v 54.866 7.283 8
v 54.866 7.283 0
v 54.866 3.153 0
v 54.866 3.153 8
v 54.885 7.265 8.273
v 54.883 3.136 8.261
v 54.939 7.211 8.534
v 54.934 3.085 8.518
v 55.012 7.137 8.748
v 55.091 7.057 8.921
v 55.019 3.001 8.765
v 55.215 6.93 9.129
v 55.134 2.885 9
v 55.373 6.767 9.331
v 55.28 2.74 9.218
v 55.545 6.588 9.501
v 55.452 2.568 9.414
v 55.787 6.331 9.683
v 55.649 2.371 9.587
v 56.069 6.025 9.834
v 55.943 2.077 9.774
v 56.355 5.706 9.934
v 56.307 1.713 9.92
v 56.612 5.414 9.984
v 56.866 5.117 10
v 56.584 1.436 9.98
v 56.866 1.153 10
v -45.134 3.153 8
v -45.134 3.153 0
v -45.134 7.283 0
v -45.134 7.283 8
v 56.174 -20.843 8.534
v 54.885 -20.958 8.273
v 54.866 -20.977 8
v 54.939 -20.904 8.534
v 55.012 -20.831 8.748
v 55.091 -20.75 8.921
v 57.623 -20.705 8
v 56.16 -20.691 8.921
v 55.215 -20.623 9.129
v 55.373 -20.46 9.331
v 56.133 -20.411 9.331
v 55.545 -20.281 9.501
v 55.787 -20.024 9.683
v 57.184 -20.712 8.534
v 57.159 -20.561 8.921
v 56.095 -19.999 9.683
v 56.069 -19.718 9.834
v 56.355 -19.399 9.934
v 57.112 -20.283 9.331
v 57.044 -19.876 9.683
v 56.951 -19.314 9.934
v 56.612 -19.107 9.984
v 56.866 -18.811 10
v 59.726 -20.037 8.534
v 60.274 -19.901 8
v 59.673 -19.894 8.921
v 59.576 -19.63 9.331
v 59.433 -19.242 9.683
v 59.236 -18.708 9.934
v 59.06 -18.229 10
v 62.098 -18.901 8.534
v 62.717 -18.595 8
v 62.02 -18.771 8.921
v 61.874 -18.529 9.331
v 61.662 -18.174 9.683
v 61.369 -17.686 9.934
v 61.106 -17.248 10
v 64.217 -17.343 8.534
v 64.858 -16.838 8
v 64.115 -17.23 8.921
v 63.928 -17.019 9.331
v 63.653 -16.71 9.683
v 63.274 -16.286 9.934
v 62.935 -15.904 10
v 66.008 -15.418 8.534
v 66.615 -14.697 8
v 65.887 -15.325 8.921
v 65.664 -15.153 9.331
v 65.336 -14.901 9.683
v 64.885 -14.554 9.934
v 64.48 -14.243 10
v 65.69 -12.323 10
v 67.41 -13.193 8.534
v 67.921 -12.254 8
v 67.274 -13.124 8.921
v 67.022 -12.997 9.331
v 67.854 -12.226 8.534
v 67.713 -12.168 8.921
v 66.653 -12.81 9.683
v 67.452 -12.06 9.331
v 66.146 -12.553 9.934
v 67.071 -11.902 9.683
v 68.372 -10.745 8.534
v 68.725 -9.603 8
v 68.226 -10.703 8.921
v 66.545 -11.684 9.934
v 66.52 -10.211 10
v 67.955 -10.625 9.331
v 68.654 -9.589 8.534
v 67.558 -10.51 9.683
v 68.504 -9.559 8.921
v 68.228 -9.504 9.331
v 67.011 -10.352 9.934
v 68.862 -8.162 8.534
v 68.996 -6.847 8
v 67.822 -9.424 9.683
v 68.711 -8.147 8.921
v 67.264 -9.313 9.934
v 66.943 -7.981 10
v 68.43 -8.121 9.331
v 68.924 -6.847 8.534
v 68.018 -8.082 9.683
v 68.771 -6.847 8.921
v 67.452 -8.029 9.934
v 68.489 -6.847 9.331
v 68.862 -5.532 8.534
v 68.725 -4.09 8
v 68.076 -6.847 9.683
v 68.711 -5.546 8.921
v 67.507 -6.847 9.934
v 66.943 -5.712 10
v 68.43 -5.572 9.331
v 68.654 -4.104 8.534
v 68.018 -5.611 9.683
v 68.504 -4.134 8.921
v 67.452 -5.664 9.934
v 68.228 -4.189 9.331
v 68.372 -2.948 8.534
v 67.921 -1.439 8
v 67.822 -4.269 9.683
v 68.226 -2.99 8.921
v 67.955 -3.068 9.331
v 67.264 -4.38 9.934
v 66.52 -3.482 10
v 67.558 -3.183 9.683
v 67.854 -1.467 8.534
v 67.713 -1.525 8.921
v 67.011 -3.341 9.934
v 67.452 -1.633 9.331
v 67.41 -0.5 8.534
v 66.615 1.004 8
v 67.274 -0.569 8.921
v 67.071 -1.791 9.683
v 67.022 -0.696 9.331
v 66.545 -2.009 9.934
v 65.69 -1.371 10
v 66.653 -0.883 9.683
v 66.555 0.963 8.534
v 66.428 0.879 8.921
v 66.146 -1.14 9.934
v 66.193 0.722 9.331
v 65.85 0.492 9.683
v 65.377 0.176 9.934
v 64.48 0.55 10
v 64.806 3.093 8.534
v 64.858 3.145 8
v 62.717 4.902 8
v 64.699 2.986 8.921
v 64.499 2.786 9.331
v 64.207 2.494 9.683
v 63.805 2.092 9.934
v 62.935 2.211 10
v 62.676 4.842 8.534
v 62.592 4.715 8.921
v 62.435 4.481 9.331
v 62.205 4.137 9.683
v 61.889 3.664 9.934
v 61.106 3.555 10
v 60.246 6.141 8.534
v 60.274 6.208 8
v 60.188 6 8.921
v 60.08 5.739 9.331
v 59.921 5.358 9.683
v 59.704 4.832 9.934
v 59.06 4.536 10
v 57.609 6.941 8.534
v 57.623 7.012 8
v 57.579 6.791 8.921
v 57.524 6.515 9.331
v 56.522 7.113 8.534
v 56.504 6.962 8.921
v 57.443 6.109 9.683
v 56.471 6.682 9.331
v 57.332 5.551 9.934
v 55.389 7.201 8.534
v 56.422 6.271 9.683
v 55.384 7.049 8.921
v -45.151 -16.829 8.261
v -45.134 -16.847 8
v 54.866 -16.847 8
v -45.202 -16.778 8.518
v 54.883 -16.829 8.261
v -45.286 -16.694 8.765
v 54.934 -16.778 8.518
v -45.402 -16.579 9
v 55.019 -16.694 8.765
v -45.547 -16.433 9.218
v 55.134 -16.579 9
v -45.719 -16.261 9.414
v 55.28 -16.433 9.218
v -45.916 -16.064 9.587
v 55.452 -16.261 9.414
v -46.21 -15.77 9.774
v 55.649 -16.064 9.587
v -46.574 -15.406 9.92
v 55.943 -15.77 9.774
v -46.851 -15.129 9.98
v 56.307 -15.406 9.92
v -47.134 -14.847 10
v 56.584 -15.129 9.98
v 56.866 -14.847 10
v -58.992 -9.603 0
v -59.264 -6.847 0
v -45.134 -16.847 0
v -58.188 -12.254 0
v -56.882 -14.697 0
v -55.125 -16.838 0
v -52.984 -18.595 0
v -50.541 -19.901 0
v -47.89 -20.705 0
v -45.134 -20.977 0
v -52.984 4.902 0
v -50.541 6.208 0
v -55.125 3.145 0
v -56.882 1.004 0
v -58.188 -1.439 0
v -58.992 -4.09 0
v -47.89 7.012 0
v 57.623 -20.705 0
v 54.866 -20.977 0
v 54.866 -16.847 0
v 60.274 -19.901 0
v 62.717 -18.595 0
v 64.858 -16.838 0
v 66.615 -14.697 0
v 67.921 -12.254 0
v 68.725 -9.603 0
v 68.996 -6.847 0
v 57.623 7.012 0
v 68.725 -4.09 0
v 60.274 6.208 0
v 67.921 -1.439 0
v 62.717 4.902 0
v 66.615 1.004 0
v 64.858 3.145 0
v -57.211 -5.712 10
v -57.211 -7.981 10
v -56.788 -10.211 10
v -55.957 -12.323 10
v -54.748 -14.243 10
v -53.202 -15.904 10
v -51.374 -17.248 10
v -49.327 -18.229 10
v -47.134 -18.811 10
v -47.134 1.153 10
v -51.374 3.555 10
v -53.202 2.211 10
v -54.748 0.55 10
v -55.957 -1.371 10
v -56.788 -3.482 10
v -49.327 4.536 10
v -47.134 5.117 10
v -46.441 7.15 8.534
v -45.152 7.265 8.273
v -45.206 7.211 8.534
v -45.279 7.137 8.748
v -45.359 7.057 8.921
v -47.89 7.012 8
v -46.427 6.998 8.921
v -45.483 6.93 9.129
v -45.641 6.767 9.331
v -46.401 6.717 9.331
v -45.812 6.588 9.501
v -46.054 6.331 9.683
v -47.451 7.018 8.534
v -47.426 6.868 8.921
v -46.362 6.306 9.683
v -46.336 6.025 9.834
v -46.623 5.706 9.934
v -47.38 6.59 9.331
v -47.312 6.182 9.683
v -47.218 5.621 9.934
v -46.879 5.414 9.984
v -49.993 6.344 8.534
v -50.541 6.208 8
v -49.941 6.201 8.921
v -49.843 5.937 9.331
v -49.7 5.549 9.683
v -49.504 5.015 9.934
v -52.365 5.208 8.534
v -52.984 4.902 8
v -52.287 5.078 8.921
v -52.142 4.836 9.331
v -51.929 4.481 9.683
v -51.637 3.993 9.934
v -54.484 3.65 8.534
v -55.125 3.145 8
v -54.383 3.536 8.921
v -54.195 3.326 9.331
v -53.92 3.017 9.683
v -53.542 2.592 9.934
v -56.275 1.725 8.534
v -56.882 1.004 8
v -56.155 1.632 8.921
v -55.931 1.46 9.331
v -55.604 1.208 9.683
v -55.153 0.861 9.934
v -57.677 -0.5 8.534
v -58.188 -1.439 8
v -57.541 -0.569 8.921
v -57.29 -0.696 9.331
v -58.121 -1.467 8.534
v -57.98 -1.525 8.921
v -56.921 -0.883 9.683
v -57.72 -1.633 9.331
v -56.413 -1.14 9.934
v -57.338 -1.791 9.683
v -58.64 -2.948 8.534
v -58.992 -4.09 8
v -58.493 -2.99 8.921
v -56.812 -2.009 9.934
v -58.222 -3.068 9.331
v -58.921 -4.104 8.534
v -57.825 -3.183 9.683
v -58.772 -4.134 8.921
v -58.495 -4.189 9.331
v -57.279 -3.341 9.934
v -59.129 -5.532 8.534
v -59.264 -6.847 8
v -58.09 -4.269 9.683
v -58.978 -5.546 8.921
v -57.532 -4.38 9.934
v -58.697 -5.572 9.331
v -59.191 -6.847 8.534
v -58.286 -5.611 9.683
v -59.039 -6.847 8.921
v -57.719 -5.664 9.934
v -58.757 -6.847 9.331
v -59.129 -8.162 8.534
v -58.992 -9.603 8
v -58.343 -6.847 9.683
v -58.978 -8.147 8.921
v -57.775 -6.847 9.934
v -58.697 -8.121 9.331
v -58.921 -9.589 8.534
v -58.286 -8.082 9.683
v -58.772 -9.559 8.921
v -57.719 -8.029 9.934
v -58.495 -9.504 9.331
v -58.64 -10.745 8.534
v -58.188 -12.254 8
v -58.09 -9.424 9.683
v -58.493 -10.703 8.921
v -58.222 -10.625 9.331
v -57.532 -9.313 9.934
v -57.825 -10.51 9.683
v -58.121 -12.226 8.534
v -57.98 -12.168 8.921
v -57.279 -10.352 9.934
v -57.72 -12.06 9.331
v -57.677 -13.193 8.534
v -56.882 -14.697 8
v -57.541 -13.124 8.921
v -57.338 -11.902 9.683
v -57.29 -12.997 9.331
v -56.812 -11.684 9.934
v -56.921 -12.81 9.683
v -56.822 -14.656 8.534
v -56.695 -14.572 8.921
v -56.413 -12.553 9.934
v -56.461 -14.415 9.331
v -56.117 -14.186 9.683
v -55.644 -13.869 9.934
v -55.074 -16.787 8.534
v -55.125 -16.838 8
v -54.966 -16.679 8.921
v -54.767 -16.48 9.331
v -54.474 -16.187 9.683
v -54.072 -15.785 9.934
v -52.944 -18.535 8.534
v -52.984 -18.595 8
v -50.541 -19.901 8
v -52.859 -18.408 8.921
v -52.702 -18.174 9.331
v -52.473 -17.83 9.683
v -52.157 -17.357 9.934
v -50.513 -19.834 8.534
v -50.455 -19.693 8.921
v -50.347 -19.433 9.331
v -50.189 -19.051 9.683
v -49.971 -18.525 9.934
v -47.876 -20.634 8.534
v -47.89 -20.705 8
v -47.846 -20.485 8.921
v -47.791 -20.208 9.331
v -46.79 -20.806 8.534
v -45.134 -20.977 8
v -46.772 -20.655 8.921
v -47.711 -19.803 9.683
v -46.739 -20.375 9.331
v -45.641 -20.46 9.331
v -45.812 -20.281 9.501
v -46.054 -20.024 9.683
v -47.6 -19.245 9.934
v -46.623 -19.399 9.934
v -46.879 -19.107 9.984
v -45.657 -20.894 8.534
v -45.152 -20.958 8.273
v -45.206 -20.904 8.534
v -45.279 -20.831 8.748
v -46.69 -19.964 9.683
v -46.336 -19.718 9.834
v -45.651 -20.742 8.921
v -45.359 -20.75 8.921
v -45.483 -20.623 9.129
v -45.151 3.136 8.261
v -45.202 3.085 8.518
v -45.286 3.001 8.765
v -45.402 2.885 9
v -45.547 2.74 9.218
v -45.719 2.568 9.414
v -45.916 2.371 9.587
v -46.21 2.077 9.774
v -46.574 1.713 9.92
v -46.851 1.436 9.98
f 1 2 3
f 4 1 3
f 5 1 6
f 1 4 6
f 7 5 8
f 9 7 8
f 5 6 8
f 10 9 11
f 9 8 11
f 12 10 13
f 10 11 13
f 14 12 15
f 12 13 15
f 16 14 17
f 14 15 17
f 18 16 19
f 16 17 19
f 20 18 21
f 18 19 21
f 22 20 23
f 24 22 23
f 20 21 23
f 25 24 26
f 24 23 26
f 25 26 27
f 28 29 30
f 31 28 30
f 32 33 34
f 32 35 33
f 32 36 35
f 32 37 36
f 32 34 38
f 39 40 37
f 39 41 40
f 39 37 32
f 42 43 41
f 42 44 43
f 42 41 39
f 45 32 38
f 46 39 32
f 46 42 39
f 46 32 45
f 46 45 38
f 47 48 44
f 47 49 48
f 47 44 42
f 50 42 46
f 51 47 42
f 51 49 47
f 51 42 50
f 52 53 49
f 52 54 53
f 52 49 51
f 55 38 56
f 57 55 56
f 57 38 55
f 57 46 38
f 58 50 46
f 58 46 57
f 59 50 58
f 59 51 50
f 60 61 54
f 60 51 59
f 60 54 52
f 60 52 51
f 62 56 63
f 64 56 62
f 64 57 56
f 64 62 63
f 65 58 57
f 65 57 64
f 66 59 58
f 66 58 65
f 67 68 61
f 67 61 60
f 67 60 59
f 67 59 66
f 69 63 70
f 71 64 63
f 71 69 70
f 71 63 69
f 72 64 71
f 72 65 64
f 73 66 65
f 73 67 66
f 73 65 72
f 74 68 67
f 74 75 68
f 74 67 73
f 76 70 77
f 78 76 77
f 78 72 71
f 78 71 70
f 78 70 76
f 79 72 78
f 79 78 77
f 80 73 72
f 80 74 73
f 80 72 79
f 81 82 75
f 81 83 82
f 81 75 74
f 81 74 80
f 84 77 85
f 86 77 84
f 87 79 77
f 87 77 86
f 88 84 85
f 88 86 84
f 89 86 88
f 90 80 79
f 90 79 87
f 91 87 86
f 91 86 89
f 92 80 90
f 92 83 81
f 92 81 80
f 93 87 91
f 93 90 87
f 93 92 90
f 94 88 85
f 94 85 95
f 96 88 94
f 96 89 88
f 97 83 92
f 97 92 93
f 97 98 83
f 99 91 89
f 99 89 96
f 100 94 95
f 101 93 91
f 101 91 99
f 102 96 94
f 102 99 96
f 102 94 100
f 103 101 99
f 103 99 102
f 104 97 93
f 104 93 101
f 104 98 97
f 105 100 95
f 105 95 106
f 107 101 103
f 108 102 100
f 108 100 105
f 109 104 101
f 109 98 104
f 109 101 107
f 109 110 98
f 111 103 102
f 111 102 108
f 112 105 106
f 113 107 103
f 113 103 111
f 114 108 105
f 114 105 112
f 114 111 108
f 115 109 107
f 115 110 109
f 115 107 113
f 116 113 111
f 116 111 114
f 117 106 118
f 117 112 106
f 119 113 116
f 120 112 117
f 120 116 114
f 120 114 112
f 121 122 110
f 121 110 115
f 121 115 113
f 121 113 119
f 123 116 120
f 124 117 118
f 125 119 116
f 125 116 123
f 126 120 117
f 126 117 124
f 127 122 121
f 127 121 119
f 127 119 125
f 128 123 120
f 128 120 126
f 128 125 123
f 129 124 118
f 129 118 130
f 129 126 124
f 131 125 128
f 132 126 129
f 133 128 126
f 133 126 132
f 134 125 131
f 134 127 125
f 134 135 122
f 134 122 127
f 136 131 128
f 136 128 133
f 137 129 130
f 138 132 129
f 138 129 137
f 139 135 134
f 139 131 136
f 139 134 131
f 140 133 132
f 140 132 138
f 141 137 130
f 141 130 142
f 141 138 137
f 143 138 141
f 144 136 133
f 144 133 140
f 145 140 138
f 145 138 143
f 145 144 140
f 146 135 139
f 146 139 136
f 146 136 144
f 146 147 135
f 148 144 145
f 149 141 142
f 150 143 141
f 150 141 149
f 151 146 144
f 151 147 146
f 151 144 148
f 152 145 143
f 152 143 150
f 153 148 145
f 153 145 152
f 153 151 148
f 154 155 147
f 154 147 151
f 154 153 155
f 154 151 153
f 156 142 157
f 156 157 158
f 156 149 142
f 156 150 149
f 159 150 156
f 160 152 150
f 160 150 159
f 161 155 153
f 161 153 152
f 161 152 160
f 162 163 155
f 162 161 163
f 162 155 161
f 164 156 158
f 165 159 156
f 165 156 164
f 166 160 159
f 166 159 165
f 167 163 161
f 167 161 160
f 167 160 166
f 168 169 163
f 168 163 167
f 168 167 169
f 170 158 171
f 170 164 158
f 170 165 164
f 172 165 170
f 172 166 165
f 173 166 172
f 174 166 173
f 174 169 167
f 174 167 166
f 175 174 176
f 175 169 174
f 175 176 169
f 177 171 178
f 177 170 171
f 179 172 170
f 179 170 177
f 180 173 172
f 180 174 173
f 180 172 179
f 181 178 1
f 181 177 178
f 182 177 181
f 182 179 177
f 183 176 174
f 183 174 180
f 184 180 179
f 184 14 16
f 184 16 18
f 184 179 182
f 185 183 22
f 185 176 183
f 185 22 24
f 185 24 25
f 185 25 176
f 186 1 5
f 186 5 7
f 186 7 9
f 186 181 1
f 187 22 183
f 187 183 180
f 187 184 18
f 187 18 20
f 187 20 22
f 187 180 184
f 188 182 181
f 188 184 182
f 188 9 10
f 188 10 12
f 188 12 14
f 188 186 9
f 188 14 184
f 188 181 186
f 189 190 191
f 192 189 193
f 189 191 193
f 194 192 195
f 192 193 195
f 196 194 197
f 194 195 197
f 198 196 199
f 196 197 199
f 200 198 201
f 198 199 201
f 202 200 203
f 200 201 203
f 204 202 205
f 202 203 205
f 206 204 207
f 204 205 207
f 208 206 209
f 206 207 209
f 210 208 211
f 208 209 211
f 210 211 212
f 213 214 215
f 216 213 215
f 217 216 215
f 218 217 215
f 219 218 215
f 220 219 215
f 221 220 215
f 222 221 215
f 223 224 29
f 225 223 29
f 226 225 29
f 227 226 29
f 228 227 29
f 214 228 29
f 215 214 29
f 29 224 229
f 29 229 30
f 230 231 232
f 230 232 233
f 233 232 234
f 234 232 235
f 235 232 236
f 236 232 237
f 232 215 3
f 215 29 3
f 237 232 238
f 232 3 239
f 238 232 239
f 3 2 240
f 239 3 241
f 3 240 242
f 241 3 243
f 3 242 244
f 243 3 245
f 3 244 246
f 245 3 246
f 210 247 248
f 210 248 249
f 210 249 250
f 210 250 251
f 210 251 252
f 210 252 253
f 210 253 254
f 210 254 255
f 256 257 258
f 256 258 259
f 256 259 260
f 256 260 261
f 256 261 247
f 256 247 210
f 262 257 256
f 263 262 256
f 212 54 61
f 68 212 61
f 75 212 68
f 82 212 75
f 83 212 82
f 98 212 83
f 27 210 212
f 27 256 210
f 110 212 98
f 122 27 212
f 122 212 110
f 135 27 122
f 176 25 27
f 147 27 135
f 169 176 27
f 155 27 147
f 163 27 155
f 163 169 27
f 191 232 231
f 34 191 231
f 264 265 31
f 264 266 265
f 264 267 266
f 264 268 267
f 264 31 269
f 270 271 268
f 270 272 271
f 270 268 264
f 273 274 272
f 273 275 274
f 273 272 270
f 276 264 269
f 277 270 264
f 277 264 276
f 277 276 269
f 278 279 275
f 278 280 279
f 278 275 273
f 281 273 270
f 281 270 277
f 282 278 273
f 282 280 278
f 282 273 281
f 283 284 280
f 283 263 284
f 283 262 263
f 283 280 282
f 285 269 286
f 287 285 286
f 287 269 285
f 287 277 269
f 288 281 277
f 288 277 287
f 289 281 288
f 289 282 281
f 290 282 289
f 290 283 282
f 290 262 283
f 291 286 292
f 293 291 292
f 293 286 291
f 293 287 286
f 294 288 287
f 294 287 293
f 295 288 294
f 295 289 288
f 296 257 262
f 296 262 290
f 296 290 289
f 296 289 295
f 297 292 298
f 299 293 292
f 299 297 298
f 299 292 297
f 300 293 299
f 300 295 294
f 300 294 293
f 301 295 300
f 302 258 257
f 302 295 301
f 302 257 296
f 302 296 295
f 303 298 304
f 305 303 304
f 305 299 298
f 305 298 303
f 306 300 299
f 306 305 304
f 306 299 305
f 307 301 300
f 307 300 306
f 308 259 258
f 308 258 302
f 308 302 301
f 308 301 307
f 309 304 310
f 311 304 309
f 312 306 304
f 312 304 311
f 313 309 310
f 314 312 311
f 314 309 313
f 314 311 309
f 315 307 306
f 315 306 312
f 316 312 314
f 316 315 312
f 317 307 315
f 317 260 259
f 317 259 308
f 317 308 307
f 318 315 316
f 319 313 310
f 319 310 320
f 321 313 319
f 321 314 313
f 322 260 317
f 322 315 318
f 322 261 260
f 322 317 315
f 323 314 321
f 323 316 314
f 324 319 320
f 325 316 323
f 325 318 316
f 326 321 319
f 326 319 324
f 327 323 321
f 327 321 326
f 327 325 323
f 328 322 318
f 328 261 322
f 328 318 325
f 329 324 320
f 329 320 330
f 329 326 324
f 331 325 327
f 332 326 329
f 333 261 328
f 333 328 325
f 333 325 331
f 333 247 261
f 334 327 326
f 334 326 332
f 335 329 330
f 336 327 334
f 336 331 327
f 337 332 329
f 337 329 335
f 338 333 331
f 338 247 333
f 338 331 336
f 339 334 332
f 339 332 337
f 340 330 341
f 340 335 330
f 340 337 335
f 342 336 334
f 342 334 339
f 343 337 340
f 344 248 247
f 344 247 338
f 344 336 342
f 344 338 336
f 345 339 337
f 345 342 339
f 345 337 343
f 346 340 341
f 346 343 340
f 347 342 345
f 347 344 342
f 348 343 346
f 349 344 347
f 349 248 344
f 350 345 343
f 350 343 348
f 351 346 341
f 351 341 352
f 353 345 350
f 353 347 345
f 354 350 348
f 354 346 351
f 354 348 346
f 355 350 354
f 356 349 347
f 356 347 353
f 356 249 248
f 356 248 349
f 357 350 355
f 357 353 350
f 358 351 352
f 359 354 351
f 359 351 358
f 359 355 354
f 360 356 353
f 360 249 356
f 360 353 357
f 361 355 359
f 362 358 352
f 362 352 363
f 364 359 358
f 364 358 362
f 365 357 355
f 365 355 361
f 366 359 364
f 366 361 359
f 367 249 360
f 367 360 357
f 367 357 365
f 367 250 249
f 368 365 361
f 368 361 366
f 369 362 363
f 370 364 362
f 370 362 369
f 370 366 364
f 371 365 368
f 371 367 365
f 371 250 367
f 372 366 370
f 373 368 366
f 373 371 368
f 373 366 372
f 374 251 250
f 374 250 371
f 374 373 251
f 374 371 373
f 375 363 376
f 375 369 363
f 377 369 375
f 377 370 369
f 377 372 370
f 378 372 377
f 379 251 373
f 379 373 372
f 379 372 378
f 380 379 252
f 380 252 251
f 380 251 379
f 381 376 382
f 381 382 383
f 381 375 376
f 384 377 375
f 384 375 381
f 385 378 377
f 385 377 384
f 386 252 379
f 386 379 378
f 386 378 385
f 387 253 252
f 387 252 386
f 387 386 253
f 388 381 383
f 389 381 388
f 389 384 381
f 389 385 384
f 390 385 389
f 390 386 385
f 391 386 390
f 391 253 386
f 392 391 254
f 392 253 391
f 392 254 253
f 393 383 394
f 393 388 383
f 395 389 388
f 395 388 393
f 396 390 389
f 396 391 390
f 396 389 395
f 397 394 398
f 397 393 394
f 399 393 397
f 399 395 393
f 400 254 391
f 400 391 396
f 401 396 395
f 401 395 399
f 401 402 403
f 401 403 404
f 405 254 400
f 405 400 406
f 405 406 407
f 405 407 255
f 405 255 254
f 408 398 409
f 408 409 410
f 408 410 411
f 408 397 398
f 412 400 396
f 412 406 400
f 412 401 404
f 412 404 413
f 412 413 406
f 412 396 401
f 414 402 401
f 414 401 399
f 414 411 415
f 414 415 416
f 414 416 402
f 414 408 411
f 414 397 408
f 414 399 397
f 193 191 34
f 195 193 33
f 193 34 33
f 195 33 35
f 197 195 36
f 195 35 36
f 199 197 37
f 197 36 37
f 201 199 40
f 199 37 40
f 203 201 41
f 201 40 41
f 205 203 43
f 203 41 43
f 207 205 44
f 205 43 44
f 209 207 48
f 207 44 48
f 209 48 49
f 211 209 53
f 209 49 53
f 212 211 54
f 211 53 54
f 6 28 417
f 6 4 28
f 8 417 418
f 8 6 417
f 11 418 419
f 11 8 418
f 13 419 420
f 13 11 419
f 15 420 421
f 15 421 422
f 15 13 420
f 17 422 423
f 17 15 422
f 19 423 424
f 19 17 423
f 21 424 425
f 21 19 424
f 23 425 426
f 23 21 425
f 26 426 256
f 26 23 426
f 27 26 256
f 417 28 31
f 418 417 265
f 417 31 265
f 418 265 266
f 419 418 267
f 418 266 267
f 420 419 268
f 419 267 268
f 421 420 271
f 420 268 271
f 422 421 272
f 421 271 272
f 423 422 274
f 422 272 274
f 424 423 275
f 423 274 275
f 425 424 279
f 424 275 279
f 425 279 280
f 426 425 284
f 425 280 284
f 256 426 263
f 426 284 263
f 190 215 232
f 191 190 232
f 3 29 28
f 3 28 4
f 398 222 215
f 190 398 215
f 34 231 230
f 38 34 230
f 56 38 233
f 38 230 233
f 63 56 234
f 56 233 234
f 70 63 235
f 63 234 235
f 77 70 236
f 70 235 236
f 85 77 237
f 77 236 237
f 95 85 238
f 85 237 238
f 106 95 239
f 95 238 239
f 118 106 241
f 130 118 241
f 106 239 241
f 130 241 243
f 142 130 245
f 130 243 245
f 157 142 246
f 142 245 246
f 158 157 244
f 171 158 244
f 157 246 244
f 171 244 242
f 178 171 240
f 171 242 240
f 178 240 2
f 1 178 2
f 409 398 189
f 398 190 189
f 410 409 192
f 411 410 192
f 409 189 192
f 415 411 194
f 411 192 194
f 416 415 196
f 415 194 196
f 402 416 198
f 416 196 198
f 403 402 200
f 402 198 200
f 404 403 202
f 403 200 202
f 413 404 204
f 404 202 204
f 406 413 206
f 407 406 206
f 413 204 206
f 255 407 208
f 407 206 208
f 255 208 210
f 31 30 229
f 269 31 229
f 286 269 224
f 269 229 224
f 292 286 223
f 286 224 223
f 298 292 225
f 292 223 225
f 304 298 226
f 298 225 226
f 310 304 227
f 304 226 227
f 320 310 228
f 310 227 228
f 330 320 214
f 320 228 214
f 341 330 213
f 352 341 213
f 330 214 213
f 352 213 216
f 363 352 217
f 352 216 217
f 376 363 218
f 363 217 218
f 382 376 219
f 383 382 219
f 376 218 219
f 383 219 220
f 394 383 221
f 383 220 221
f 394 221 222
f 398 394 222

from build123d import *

# Parameters (mm, degrees)
F0_W     = 100
F0_H     = 20
F1_DEPTH = 10
F2_R     = 2


with BuildPart() as f1:
    # F0 (on Top) → F1 (new body)
    with BuildSketch(Plane.XY):
        with BuildLine():
            Line((-45.133696, -16.846582), (-45.133696, 3.153418))
            Line((-45.133696, 3.153418), (-45.133696, 7.283418))
            ThreePointArc((-45.133696, 7.283418), (-59.263696, -6.846582), (-45.133696, -20.976582))
            Line((-45.133696, -20.976582), (-45.133696, -16.846582))
        make_face()
        with Locations((4.866304, -6.846582)):
            Rectangle(F0_W, F0_H)
        with BuildLine():
            Line((54.866304, 7.283418), (54.866304, 3.153418))
            Line((54.866304, 3.153418), (54.866304, -16.846582))
            Line((54.866304, -16.846582), (54.866304, -20.976582))
            ThreePointArc((54.866304, -20.976582), (68.996304, -6.846582), (54.866304, 7.283418))
        make_face()
    extrude(amount=F1_DEPTH)

    # F2
    f2_edges = [f1.edges().sort_by_distance(p)[0] for p in [
        (-45.133696, 5.218418, 10),
        (-45.133696, -18.911582, 10),
        (-59.263696, -6.846582, 10),
        (4.866304, 3.153418, 10),
        (4.866304, -16.846582, 10),
        (68.996304, -6.846582, 10),
        (54.866304, 5.218418, 10),
        (54.866304, -18.911582, 10),
    ]]
    fillet(f2_edges, radius=F2_R)


solid = f1.part
